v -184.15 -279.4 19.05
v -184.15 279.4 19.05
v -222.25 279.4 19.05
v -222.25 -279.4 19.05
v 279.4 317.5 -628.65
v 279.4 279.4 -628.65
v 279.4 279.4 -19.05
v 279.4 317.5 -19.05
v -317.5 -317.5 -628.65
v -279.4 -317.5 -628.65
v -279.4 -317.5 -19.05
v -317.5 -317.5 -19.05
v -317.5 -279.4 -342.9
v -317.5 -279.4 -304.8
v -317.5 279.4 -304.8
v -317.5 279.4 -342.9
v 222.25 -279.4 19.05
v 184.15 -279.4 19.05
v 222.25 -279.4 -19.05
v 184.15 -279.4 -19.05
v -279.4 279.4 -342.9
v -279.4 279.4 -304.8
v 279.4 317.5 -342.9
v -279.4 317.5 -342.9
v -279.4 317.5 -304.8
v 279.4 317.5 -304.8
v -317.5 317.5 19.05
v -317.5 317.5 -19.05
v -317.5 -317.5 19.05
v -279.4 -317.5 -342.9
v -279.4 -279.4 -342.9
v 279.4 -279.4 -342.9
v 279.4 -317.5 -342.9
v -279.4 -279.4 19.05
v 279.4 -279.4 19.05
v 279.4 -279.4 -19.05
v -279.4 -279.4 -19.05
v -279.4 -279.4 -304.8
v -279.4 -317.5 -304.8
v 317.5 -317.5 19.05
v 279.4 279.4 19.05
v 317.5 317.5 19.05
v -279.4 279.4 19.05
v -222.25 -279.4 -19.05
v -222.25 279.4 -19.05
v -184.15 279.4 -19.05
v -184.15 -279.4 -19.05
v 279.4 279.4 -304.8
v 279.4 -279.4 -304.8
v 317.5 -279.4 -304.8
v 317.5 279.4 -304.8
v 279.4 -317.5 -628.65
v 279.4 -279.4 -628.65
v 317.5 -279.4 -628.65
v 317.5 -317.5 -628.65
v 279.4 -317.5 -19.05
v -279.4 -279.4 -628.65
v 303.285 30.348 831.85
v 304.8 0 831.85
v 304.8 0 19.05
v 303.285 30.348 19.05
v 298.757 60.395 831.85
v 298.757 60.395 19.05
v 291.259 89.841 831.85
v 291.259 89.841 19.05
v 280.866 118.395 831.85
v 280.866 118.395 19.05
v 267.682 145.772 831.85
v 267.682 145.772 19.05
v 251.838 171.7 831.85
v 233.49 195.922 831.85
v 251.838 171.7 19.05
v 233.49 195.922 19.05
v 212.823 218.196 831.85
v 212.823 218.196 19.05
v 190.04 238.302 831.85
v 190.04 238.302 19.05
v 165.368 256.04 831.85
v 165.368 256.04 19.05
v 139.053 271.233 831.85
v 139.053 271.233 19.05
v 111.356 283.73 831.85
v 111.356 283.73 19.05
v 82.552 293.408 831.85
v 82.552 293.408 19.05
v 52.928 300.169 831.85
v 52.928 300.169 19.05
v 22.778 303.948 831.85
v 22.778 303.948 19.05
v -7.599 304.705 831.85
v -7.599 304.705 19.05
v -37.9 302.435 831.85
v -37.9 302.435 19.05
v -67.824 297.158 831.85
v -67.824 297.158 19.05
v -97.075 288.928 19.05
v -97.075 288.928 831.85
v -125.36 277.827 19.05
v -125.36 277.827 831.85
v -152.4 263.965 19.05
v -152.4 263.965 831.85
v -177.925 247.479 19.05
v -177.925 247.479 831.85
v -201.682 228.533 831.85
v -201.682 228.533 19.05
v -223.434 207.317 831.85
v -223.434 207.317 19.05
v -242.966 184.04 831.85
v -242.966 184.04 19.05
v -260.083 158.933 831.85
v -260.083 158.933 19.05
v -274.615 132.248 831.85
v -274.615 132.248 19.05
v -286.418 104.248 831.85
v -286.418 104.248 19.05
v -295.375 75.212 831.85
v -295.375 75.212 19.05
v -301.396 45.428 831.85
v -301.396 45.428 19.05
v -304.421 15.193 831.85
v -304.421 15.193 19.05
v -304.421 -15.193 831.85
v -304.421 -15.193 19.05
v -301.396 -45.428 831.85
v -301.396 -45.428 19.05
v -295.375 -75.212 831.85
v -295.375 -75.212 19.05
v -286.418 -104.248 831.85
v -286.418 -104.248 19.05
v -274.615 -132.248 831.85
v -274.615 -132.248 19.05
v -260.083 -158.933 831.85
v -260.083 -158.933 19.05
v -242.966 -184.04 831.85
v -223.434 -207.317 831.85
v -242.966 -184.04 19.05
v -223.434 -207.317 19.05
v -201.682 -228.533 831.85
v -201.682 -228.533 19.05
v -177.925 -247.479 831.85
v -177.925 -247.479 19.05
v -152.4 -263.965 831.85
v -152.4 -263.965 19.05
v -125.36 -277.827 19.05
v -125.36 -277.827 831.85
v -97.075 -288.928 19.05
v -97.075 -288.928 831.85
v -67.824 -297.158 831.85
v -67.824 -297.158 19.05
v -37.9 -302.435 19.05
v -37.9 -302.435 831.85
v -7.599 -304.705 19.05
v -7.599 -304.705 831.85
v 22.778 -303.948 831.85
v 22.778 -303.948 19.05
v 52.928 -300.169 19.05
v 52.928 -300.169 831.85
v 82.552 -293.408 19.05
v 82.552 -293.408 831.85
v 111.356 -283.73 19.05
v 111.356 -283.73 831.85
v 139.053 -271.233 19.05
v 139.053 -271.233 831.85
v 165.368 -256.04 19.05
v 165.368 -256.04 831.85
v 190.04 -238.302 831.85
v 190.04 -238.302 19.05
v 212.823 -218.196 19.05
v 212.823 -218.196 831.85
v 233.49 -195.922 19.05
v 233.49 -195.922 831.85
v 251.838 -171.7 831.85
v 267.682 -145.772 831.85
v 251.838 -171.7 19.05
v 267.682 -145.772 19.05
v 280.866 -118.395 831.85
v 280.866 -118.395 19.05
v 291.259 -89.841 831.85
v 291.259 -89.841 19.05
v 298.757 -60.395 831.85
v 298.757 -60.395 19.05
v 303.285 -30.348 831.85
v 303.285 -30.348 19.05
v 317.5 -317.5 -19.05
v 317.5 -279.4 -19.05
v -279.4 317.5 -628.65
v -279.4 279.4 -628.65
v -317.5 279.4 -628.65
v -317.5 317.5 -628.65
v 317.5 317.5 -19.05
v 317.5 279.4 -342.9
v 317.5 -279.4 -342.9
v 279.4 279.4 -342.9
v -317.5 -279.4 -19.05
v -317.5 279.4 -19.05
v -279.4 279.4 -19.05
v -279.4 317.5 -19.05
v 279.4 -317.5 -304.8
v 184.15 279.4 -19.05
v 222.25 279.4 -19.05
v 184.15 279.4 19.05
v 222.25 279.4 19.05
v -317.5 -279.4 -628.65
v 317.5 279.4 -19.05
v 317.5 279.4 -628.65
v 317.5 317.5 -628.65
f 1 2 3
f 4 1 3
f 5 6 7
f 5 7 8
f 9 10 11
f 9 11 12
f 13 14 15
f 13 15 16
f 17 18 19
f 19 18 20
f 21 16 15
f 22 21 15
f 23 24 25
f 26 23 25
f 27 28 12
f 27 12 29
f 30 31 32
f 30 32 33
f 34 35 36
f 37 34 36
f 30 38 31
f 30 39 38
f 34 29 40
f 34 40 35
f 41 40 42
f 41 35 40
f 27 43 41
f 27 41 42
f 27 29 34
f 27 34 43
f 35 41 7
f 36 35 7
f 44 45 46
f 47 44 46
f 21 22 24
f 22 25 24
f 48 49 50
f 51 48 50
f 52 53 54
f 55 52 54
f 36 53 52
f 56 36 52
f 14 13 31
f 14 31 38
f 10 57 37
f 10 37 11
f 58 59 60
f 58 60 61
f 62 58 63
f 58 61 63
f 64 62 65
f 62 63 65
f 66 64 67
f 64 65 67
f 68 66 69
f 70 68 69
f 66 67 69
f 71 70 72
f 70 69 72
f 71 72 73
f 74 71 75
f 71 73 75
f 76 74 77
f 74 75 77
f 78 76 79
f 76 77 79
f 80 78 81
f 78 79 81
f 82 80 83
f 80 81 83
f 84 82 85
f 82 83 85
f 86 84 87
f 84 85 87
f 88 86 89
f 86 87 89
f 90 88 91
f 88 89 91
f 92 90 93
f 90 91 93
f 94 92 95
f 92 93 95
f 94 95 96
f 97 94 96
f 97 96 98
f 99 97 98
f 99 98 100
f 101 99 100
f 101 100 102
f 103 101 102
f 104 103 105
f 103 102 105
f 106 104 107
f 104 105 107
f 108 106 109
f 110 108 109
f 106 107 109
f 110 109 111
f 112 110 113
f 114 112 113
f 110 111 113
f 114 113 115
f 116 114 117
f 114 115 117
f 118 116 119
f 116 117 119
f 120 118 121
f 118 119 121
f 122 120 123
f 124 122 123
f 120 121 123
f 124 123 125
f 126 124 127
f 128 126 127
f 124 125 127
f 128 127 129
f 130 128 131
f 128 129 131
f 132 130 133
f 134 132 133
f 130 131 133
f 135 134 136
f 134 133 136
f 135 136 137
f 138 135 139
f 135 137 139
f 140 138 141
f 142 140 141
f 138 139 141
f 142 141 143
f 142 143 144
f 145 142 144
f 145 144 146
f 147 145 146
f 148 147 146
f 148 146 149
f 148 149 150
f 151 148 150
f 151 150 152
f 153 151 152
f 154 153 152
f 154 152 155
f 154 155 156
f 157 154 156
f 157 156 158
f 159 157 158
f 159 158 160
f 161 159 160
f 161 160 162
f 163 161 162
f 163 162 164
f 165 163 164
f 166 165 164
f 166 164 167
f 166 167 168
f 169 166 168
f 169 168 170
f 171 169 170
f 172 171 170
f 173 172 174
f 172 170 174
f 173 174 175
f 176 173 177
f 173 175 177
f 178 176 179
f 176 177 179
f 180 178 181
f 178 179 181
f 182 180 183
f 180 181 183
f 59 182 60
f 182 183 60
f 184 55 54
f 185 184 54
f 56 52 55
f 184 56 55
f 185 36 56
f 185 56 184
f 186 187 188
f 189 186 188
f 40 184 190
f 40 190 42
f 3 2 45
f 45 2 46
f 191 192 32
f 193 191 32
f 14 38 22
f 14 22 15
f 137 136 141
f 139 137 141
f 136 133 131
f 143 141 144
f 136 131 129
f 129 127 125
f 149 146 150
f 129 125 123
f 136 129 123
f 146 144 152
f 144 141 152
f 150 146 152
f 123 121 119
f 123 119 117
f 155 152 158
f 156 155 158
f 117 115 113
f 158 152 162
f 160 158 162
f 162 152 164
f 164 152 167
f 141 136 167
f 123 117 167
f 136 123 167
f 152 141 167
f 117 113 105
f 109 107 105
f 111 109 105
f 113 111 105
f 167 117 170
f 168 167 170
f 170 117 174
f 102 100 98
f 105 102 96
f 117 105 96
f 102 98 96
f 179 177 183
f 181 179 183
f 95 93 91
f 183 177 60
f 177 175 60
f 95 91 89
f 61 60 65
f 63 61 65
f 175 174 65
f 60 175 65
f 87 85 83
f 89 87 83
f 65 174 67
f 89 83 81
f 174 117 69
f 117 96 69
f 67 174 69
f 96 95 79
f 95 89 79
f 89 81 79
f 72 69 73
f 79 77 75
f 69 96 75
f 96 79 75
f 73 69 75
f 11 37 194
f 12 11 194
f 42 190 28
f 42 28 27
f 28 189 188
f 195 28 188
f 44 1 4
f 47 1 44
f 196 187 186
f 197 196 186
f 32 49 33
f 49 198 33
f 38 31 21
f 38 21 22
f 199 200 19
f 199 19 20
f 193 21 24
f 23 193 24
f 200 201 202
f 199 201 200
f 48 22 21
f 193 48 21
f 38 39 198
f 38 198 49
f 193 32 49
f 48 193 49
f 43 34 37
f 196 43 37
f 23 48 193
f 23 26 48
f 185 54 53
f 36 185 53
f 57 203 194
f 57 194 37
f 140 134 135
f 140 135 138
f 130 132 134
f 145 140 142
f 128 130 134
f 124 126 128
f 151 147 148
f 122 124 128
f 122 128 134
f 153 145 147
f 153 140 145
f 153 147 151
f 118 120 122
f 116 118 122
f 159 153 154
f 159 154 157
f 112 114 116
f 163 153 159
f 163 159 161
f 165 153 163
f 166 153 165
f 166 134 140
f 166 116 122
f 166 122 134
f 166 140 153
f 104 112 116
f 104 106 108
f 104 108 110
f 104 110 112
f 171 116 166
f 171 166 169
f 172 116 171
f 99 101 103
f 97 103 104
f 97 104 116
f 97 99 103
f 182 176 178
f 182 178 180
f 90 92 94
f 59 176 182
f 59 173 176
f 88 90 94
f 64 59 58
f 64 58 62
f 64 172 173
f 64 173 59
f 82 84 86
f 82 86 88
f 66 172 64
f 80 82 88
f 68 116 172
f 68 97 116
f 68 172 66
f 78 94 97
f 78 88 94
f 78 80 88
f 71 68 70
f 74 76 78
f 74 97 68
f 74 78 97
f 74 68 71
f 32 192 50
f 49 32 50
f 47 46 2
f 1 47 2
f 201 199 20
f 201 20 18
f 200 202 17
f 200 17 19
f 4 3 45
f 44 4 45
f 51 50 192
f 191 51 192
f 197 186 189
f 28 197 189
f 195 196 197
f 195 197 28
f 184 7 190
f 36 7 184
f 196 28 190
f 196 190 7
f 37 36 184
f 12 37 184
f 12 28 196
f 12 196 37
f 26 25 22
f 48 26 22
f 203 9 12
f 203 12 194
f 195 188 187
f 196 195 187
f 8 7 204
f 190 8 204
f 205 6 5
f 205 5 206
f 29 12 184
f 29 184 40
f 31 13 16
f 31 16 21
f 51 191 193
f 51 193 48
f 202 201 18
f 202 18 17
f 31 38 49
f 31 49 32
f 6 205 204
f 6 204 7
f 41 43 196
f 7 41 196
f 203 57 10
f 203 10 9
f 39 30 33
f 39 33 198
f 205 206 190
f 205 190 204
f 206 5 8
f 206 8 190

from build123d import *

# Parameters (mm, degrees)
F2_W      = 38.1
F2_H      = 38.1
F7_W      = 38.1
F7_H      = 38.1
F14_W     = 38.1
F14_H     = 38.1
F19_W     = 38.1
F19_H     = 38.1
F23_W     = 38.1
F23_H     = 38.1
F26_R     = 304.8
F27_DEPTH = 812.8


with BuildPart() as f3:
    # F3: sweep along a path in F0
    with BuildLine(Plane.XY) as f3_path:
        Line((298.45, -298.45), (-298.45, -298.45))
        Line((-298.45, -298.45), (-298.45, 298.45))
        Line((-298.45, 298.45), (298.45, 298.45))
        Line((298.45, 298.45), (298.45, -298.45))
    # F2 (on line) → F3 (sweep)
    with BuildSketch(Plane(origin=(298.45, 0, 0), x_dir=(0, -1, 0), z_dir=(-1, 0, 0))):
        with Locations((298.45, 0)):
            Rectangle(F2_W, F2_H)
    sweep(path=f3_path.line, transition=Transition.RIGHT)


with BuildPart() as f8:
    # F8: sweep along a path in F5
    with BuildLine(Plane.XZ.offset(298.45)) as f8_path:
        Line((-298.45, -19.05), (-298.45, -628.65))
    # F7 (on line) → F8 (sweep)
    with BuildSketch(Plane(origin=(0, 0, -628.65), x_dir=(1, 0, 0), z_dir=(0, 0, -1))):
        with Locations((-298.45, 298.45)):
            Rectangle(F7_W, F7_H)
    sweep(path=f8_path.line)


with BuildPart() as f11_1:
    # F11: instance of F8
    add(f8.part.mirror(Plane.YZ))


with BuildPart() as f12_1:
    # F12: instance of F8
    add(f8.part.mirror(Plane.XZ))


with BuildPart() as f12_2:
    # F12: instance of F11_1
    add(f11_1.part.mirror(Plane.XZ))


with BuildPart() as f15:
    # F15: sweep along a path in F13
    with BuildLine(Plane.XZ.offset(298.45)) as f15_path:
        Line((-279.4, -323.85), (279.4, -323.85))
    # F14 (on face) → F15 (sweep)
    with BuildSketch(Plane(origin=(279.4, 0, 0), x_dir=(0, -1, 0), z_dir=(-1, 0, 0))):
        with Locations((298.45, -323.85)):
            Rectangle(F14_W, F14_H)
    sweep(path=f15_path.line)


with BuildPart() as f16_1:
    # F16: instance of F15
    add(f15.part.mirror(Plane.XZ))


with BuildPart() as f20:
    # F20: sweep along a path in F18
    with BuildLine(Plane.YZ.offset(298.45)) as f20_path:
        Line((-279.4, -323.85), (279.4, -323.85))
    # F19 (on face) → F20 (sweep)
    with BuildSketch(Plane(origin=(0, -279.4, 0), x_dir=(-1, 0, 0), z_dir=(0, 1, 0))):
        with Locations((-298.45, -323.85)):
            Rectangle(F19_W, F19_H)
    sweep(path=f20_path.line)


with BuildPart() as f21_1:
    # F21: instance of F20
    add(f20.part.mirror(Plane.YZ))


with BuildPart() as f24:
    # F24: sweep along a path in F22
    with BuildLine(Plane.XY) as f24_path:
        Line((-203.2, 279.4), (-203.2, -279.4))
    # F23 (on face) → F24 (sweep)
    with BuildSketch(Plane.XZ.offset(-279.4)):
        with Locations((-203.2, 0)):
            Rectangle(F23_W, F23_H)
    sweep(path=f24_path.line)


with BuildPart() as f25_1:
    # F25: instance of F24
    add(f24.part.mirror(Plane.YZ))


with BuildPart() as f27:
    # F26 (on face) → F27 (new body)
    with BuildSketch(Plane.XY.offset(19.05)):
        Circle(F26_R)
    extrude(amount=F27_DEPTH)


solid = Compound([f3.part, f8.part, f11_1.part, f12_1.part, f12_2.part, f15.part, f16_1.part, f20.part, f21_1.part, f24.part, f25_1.part, f27.part])
